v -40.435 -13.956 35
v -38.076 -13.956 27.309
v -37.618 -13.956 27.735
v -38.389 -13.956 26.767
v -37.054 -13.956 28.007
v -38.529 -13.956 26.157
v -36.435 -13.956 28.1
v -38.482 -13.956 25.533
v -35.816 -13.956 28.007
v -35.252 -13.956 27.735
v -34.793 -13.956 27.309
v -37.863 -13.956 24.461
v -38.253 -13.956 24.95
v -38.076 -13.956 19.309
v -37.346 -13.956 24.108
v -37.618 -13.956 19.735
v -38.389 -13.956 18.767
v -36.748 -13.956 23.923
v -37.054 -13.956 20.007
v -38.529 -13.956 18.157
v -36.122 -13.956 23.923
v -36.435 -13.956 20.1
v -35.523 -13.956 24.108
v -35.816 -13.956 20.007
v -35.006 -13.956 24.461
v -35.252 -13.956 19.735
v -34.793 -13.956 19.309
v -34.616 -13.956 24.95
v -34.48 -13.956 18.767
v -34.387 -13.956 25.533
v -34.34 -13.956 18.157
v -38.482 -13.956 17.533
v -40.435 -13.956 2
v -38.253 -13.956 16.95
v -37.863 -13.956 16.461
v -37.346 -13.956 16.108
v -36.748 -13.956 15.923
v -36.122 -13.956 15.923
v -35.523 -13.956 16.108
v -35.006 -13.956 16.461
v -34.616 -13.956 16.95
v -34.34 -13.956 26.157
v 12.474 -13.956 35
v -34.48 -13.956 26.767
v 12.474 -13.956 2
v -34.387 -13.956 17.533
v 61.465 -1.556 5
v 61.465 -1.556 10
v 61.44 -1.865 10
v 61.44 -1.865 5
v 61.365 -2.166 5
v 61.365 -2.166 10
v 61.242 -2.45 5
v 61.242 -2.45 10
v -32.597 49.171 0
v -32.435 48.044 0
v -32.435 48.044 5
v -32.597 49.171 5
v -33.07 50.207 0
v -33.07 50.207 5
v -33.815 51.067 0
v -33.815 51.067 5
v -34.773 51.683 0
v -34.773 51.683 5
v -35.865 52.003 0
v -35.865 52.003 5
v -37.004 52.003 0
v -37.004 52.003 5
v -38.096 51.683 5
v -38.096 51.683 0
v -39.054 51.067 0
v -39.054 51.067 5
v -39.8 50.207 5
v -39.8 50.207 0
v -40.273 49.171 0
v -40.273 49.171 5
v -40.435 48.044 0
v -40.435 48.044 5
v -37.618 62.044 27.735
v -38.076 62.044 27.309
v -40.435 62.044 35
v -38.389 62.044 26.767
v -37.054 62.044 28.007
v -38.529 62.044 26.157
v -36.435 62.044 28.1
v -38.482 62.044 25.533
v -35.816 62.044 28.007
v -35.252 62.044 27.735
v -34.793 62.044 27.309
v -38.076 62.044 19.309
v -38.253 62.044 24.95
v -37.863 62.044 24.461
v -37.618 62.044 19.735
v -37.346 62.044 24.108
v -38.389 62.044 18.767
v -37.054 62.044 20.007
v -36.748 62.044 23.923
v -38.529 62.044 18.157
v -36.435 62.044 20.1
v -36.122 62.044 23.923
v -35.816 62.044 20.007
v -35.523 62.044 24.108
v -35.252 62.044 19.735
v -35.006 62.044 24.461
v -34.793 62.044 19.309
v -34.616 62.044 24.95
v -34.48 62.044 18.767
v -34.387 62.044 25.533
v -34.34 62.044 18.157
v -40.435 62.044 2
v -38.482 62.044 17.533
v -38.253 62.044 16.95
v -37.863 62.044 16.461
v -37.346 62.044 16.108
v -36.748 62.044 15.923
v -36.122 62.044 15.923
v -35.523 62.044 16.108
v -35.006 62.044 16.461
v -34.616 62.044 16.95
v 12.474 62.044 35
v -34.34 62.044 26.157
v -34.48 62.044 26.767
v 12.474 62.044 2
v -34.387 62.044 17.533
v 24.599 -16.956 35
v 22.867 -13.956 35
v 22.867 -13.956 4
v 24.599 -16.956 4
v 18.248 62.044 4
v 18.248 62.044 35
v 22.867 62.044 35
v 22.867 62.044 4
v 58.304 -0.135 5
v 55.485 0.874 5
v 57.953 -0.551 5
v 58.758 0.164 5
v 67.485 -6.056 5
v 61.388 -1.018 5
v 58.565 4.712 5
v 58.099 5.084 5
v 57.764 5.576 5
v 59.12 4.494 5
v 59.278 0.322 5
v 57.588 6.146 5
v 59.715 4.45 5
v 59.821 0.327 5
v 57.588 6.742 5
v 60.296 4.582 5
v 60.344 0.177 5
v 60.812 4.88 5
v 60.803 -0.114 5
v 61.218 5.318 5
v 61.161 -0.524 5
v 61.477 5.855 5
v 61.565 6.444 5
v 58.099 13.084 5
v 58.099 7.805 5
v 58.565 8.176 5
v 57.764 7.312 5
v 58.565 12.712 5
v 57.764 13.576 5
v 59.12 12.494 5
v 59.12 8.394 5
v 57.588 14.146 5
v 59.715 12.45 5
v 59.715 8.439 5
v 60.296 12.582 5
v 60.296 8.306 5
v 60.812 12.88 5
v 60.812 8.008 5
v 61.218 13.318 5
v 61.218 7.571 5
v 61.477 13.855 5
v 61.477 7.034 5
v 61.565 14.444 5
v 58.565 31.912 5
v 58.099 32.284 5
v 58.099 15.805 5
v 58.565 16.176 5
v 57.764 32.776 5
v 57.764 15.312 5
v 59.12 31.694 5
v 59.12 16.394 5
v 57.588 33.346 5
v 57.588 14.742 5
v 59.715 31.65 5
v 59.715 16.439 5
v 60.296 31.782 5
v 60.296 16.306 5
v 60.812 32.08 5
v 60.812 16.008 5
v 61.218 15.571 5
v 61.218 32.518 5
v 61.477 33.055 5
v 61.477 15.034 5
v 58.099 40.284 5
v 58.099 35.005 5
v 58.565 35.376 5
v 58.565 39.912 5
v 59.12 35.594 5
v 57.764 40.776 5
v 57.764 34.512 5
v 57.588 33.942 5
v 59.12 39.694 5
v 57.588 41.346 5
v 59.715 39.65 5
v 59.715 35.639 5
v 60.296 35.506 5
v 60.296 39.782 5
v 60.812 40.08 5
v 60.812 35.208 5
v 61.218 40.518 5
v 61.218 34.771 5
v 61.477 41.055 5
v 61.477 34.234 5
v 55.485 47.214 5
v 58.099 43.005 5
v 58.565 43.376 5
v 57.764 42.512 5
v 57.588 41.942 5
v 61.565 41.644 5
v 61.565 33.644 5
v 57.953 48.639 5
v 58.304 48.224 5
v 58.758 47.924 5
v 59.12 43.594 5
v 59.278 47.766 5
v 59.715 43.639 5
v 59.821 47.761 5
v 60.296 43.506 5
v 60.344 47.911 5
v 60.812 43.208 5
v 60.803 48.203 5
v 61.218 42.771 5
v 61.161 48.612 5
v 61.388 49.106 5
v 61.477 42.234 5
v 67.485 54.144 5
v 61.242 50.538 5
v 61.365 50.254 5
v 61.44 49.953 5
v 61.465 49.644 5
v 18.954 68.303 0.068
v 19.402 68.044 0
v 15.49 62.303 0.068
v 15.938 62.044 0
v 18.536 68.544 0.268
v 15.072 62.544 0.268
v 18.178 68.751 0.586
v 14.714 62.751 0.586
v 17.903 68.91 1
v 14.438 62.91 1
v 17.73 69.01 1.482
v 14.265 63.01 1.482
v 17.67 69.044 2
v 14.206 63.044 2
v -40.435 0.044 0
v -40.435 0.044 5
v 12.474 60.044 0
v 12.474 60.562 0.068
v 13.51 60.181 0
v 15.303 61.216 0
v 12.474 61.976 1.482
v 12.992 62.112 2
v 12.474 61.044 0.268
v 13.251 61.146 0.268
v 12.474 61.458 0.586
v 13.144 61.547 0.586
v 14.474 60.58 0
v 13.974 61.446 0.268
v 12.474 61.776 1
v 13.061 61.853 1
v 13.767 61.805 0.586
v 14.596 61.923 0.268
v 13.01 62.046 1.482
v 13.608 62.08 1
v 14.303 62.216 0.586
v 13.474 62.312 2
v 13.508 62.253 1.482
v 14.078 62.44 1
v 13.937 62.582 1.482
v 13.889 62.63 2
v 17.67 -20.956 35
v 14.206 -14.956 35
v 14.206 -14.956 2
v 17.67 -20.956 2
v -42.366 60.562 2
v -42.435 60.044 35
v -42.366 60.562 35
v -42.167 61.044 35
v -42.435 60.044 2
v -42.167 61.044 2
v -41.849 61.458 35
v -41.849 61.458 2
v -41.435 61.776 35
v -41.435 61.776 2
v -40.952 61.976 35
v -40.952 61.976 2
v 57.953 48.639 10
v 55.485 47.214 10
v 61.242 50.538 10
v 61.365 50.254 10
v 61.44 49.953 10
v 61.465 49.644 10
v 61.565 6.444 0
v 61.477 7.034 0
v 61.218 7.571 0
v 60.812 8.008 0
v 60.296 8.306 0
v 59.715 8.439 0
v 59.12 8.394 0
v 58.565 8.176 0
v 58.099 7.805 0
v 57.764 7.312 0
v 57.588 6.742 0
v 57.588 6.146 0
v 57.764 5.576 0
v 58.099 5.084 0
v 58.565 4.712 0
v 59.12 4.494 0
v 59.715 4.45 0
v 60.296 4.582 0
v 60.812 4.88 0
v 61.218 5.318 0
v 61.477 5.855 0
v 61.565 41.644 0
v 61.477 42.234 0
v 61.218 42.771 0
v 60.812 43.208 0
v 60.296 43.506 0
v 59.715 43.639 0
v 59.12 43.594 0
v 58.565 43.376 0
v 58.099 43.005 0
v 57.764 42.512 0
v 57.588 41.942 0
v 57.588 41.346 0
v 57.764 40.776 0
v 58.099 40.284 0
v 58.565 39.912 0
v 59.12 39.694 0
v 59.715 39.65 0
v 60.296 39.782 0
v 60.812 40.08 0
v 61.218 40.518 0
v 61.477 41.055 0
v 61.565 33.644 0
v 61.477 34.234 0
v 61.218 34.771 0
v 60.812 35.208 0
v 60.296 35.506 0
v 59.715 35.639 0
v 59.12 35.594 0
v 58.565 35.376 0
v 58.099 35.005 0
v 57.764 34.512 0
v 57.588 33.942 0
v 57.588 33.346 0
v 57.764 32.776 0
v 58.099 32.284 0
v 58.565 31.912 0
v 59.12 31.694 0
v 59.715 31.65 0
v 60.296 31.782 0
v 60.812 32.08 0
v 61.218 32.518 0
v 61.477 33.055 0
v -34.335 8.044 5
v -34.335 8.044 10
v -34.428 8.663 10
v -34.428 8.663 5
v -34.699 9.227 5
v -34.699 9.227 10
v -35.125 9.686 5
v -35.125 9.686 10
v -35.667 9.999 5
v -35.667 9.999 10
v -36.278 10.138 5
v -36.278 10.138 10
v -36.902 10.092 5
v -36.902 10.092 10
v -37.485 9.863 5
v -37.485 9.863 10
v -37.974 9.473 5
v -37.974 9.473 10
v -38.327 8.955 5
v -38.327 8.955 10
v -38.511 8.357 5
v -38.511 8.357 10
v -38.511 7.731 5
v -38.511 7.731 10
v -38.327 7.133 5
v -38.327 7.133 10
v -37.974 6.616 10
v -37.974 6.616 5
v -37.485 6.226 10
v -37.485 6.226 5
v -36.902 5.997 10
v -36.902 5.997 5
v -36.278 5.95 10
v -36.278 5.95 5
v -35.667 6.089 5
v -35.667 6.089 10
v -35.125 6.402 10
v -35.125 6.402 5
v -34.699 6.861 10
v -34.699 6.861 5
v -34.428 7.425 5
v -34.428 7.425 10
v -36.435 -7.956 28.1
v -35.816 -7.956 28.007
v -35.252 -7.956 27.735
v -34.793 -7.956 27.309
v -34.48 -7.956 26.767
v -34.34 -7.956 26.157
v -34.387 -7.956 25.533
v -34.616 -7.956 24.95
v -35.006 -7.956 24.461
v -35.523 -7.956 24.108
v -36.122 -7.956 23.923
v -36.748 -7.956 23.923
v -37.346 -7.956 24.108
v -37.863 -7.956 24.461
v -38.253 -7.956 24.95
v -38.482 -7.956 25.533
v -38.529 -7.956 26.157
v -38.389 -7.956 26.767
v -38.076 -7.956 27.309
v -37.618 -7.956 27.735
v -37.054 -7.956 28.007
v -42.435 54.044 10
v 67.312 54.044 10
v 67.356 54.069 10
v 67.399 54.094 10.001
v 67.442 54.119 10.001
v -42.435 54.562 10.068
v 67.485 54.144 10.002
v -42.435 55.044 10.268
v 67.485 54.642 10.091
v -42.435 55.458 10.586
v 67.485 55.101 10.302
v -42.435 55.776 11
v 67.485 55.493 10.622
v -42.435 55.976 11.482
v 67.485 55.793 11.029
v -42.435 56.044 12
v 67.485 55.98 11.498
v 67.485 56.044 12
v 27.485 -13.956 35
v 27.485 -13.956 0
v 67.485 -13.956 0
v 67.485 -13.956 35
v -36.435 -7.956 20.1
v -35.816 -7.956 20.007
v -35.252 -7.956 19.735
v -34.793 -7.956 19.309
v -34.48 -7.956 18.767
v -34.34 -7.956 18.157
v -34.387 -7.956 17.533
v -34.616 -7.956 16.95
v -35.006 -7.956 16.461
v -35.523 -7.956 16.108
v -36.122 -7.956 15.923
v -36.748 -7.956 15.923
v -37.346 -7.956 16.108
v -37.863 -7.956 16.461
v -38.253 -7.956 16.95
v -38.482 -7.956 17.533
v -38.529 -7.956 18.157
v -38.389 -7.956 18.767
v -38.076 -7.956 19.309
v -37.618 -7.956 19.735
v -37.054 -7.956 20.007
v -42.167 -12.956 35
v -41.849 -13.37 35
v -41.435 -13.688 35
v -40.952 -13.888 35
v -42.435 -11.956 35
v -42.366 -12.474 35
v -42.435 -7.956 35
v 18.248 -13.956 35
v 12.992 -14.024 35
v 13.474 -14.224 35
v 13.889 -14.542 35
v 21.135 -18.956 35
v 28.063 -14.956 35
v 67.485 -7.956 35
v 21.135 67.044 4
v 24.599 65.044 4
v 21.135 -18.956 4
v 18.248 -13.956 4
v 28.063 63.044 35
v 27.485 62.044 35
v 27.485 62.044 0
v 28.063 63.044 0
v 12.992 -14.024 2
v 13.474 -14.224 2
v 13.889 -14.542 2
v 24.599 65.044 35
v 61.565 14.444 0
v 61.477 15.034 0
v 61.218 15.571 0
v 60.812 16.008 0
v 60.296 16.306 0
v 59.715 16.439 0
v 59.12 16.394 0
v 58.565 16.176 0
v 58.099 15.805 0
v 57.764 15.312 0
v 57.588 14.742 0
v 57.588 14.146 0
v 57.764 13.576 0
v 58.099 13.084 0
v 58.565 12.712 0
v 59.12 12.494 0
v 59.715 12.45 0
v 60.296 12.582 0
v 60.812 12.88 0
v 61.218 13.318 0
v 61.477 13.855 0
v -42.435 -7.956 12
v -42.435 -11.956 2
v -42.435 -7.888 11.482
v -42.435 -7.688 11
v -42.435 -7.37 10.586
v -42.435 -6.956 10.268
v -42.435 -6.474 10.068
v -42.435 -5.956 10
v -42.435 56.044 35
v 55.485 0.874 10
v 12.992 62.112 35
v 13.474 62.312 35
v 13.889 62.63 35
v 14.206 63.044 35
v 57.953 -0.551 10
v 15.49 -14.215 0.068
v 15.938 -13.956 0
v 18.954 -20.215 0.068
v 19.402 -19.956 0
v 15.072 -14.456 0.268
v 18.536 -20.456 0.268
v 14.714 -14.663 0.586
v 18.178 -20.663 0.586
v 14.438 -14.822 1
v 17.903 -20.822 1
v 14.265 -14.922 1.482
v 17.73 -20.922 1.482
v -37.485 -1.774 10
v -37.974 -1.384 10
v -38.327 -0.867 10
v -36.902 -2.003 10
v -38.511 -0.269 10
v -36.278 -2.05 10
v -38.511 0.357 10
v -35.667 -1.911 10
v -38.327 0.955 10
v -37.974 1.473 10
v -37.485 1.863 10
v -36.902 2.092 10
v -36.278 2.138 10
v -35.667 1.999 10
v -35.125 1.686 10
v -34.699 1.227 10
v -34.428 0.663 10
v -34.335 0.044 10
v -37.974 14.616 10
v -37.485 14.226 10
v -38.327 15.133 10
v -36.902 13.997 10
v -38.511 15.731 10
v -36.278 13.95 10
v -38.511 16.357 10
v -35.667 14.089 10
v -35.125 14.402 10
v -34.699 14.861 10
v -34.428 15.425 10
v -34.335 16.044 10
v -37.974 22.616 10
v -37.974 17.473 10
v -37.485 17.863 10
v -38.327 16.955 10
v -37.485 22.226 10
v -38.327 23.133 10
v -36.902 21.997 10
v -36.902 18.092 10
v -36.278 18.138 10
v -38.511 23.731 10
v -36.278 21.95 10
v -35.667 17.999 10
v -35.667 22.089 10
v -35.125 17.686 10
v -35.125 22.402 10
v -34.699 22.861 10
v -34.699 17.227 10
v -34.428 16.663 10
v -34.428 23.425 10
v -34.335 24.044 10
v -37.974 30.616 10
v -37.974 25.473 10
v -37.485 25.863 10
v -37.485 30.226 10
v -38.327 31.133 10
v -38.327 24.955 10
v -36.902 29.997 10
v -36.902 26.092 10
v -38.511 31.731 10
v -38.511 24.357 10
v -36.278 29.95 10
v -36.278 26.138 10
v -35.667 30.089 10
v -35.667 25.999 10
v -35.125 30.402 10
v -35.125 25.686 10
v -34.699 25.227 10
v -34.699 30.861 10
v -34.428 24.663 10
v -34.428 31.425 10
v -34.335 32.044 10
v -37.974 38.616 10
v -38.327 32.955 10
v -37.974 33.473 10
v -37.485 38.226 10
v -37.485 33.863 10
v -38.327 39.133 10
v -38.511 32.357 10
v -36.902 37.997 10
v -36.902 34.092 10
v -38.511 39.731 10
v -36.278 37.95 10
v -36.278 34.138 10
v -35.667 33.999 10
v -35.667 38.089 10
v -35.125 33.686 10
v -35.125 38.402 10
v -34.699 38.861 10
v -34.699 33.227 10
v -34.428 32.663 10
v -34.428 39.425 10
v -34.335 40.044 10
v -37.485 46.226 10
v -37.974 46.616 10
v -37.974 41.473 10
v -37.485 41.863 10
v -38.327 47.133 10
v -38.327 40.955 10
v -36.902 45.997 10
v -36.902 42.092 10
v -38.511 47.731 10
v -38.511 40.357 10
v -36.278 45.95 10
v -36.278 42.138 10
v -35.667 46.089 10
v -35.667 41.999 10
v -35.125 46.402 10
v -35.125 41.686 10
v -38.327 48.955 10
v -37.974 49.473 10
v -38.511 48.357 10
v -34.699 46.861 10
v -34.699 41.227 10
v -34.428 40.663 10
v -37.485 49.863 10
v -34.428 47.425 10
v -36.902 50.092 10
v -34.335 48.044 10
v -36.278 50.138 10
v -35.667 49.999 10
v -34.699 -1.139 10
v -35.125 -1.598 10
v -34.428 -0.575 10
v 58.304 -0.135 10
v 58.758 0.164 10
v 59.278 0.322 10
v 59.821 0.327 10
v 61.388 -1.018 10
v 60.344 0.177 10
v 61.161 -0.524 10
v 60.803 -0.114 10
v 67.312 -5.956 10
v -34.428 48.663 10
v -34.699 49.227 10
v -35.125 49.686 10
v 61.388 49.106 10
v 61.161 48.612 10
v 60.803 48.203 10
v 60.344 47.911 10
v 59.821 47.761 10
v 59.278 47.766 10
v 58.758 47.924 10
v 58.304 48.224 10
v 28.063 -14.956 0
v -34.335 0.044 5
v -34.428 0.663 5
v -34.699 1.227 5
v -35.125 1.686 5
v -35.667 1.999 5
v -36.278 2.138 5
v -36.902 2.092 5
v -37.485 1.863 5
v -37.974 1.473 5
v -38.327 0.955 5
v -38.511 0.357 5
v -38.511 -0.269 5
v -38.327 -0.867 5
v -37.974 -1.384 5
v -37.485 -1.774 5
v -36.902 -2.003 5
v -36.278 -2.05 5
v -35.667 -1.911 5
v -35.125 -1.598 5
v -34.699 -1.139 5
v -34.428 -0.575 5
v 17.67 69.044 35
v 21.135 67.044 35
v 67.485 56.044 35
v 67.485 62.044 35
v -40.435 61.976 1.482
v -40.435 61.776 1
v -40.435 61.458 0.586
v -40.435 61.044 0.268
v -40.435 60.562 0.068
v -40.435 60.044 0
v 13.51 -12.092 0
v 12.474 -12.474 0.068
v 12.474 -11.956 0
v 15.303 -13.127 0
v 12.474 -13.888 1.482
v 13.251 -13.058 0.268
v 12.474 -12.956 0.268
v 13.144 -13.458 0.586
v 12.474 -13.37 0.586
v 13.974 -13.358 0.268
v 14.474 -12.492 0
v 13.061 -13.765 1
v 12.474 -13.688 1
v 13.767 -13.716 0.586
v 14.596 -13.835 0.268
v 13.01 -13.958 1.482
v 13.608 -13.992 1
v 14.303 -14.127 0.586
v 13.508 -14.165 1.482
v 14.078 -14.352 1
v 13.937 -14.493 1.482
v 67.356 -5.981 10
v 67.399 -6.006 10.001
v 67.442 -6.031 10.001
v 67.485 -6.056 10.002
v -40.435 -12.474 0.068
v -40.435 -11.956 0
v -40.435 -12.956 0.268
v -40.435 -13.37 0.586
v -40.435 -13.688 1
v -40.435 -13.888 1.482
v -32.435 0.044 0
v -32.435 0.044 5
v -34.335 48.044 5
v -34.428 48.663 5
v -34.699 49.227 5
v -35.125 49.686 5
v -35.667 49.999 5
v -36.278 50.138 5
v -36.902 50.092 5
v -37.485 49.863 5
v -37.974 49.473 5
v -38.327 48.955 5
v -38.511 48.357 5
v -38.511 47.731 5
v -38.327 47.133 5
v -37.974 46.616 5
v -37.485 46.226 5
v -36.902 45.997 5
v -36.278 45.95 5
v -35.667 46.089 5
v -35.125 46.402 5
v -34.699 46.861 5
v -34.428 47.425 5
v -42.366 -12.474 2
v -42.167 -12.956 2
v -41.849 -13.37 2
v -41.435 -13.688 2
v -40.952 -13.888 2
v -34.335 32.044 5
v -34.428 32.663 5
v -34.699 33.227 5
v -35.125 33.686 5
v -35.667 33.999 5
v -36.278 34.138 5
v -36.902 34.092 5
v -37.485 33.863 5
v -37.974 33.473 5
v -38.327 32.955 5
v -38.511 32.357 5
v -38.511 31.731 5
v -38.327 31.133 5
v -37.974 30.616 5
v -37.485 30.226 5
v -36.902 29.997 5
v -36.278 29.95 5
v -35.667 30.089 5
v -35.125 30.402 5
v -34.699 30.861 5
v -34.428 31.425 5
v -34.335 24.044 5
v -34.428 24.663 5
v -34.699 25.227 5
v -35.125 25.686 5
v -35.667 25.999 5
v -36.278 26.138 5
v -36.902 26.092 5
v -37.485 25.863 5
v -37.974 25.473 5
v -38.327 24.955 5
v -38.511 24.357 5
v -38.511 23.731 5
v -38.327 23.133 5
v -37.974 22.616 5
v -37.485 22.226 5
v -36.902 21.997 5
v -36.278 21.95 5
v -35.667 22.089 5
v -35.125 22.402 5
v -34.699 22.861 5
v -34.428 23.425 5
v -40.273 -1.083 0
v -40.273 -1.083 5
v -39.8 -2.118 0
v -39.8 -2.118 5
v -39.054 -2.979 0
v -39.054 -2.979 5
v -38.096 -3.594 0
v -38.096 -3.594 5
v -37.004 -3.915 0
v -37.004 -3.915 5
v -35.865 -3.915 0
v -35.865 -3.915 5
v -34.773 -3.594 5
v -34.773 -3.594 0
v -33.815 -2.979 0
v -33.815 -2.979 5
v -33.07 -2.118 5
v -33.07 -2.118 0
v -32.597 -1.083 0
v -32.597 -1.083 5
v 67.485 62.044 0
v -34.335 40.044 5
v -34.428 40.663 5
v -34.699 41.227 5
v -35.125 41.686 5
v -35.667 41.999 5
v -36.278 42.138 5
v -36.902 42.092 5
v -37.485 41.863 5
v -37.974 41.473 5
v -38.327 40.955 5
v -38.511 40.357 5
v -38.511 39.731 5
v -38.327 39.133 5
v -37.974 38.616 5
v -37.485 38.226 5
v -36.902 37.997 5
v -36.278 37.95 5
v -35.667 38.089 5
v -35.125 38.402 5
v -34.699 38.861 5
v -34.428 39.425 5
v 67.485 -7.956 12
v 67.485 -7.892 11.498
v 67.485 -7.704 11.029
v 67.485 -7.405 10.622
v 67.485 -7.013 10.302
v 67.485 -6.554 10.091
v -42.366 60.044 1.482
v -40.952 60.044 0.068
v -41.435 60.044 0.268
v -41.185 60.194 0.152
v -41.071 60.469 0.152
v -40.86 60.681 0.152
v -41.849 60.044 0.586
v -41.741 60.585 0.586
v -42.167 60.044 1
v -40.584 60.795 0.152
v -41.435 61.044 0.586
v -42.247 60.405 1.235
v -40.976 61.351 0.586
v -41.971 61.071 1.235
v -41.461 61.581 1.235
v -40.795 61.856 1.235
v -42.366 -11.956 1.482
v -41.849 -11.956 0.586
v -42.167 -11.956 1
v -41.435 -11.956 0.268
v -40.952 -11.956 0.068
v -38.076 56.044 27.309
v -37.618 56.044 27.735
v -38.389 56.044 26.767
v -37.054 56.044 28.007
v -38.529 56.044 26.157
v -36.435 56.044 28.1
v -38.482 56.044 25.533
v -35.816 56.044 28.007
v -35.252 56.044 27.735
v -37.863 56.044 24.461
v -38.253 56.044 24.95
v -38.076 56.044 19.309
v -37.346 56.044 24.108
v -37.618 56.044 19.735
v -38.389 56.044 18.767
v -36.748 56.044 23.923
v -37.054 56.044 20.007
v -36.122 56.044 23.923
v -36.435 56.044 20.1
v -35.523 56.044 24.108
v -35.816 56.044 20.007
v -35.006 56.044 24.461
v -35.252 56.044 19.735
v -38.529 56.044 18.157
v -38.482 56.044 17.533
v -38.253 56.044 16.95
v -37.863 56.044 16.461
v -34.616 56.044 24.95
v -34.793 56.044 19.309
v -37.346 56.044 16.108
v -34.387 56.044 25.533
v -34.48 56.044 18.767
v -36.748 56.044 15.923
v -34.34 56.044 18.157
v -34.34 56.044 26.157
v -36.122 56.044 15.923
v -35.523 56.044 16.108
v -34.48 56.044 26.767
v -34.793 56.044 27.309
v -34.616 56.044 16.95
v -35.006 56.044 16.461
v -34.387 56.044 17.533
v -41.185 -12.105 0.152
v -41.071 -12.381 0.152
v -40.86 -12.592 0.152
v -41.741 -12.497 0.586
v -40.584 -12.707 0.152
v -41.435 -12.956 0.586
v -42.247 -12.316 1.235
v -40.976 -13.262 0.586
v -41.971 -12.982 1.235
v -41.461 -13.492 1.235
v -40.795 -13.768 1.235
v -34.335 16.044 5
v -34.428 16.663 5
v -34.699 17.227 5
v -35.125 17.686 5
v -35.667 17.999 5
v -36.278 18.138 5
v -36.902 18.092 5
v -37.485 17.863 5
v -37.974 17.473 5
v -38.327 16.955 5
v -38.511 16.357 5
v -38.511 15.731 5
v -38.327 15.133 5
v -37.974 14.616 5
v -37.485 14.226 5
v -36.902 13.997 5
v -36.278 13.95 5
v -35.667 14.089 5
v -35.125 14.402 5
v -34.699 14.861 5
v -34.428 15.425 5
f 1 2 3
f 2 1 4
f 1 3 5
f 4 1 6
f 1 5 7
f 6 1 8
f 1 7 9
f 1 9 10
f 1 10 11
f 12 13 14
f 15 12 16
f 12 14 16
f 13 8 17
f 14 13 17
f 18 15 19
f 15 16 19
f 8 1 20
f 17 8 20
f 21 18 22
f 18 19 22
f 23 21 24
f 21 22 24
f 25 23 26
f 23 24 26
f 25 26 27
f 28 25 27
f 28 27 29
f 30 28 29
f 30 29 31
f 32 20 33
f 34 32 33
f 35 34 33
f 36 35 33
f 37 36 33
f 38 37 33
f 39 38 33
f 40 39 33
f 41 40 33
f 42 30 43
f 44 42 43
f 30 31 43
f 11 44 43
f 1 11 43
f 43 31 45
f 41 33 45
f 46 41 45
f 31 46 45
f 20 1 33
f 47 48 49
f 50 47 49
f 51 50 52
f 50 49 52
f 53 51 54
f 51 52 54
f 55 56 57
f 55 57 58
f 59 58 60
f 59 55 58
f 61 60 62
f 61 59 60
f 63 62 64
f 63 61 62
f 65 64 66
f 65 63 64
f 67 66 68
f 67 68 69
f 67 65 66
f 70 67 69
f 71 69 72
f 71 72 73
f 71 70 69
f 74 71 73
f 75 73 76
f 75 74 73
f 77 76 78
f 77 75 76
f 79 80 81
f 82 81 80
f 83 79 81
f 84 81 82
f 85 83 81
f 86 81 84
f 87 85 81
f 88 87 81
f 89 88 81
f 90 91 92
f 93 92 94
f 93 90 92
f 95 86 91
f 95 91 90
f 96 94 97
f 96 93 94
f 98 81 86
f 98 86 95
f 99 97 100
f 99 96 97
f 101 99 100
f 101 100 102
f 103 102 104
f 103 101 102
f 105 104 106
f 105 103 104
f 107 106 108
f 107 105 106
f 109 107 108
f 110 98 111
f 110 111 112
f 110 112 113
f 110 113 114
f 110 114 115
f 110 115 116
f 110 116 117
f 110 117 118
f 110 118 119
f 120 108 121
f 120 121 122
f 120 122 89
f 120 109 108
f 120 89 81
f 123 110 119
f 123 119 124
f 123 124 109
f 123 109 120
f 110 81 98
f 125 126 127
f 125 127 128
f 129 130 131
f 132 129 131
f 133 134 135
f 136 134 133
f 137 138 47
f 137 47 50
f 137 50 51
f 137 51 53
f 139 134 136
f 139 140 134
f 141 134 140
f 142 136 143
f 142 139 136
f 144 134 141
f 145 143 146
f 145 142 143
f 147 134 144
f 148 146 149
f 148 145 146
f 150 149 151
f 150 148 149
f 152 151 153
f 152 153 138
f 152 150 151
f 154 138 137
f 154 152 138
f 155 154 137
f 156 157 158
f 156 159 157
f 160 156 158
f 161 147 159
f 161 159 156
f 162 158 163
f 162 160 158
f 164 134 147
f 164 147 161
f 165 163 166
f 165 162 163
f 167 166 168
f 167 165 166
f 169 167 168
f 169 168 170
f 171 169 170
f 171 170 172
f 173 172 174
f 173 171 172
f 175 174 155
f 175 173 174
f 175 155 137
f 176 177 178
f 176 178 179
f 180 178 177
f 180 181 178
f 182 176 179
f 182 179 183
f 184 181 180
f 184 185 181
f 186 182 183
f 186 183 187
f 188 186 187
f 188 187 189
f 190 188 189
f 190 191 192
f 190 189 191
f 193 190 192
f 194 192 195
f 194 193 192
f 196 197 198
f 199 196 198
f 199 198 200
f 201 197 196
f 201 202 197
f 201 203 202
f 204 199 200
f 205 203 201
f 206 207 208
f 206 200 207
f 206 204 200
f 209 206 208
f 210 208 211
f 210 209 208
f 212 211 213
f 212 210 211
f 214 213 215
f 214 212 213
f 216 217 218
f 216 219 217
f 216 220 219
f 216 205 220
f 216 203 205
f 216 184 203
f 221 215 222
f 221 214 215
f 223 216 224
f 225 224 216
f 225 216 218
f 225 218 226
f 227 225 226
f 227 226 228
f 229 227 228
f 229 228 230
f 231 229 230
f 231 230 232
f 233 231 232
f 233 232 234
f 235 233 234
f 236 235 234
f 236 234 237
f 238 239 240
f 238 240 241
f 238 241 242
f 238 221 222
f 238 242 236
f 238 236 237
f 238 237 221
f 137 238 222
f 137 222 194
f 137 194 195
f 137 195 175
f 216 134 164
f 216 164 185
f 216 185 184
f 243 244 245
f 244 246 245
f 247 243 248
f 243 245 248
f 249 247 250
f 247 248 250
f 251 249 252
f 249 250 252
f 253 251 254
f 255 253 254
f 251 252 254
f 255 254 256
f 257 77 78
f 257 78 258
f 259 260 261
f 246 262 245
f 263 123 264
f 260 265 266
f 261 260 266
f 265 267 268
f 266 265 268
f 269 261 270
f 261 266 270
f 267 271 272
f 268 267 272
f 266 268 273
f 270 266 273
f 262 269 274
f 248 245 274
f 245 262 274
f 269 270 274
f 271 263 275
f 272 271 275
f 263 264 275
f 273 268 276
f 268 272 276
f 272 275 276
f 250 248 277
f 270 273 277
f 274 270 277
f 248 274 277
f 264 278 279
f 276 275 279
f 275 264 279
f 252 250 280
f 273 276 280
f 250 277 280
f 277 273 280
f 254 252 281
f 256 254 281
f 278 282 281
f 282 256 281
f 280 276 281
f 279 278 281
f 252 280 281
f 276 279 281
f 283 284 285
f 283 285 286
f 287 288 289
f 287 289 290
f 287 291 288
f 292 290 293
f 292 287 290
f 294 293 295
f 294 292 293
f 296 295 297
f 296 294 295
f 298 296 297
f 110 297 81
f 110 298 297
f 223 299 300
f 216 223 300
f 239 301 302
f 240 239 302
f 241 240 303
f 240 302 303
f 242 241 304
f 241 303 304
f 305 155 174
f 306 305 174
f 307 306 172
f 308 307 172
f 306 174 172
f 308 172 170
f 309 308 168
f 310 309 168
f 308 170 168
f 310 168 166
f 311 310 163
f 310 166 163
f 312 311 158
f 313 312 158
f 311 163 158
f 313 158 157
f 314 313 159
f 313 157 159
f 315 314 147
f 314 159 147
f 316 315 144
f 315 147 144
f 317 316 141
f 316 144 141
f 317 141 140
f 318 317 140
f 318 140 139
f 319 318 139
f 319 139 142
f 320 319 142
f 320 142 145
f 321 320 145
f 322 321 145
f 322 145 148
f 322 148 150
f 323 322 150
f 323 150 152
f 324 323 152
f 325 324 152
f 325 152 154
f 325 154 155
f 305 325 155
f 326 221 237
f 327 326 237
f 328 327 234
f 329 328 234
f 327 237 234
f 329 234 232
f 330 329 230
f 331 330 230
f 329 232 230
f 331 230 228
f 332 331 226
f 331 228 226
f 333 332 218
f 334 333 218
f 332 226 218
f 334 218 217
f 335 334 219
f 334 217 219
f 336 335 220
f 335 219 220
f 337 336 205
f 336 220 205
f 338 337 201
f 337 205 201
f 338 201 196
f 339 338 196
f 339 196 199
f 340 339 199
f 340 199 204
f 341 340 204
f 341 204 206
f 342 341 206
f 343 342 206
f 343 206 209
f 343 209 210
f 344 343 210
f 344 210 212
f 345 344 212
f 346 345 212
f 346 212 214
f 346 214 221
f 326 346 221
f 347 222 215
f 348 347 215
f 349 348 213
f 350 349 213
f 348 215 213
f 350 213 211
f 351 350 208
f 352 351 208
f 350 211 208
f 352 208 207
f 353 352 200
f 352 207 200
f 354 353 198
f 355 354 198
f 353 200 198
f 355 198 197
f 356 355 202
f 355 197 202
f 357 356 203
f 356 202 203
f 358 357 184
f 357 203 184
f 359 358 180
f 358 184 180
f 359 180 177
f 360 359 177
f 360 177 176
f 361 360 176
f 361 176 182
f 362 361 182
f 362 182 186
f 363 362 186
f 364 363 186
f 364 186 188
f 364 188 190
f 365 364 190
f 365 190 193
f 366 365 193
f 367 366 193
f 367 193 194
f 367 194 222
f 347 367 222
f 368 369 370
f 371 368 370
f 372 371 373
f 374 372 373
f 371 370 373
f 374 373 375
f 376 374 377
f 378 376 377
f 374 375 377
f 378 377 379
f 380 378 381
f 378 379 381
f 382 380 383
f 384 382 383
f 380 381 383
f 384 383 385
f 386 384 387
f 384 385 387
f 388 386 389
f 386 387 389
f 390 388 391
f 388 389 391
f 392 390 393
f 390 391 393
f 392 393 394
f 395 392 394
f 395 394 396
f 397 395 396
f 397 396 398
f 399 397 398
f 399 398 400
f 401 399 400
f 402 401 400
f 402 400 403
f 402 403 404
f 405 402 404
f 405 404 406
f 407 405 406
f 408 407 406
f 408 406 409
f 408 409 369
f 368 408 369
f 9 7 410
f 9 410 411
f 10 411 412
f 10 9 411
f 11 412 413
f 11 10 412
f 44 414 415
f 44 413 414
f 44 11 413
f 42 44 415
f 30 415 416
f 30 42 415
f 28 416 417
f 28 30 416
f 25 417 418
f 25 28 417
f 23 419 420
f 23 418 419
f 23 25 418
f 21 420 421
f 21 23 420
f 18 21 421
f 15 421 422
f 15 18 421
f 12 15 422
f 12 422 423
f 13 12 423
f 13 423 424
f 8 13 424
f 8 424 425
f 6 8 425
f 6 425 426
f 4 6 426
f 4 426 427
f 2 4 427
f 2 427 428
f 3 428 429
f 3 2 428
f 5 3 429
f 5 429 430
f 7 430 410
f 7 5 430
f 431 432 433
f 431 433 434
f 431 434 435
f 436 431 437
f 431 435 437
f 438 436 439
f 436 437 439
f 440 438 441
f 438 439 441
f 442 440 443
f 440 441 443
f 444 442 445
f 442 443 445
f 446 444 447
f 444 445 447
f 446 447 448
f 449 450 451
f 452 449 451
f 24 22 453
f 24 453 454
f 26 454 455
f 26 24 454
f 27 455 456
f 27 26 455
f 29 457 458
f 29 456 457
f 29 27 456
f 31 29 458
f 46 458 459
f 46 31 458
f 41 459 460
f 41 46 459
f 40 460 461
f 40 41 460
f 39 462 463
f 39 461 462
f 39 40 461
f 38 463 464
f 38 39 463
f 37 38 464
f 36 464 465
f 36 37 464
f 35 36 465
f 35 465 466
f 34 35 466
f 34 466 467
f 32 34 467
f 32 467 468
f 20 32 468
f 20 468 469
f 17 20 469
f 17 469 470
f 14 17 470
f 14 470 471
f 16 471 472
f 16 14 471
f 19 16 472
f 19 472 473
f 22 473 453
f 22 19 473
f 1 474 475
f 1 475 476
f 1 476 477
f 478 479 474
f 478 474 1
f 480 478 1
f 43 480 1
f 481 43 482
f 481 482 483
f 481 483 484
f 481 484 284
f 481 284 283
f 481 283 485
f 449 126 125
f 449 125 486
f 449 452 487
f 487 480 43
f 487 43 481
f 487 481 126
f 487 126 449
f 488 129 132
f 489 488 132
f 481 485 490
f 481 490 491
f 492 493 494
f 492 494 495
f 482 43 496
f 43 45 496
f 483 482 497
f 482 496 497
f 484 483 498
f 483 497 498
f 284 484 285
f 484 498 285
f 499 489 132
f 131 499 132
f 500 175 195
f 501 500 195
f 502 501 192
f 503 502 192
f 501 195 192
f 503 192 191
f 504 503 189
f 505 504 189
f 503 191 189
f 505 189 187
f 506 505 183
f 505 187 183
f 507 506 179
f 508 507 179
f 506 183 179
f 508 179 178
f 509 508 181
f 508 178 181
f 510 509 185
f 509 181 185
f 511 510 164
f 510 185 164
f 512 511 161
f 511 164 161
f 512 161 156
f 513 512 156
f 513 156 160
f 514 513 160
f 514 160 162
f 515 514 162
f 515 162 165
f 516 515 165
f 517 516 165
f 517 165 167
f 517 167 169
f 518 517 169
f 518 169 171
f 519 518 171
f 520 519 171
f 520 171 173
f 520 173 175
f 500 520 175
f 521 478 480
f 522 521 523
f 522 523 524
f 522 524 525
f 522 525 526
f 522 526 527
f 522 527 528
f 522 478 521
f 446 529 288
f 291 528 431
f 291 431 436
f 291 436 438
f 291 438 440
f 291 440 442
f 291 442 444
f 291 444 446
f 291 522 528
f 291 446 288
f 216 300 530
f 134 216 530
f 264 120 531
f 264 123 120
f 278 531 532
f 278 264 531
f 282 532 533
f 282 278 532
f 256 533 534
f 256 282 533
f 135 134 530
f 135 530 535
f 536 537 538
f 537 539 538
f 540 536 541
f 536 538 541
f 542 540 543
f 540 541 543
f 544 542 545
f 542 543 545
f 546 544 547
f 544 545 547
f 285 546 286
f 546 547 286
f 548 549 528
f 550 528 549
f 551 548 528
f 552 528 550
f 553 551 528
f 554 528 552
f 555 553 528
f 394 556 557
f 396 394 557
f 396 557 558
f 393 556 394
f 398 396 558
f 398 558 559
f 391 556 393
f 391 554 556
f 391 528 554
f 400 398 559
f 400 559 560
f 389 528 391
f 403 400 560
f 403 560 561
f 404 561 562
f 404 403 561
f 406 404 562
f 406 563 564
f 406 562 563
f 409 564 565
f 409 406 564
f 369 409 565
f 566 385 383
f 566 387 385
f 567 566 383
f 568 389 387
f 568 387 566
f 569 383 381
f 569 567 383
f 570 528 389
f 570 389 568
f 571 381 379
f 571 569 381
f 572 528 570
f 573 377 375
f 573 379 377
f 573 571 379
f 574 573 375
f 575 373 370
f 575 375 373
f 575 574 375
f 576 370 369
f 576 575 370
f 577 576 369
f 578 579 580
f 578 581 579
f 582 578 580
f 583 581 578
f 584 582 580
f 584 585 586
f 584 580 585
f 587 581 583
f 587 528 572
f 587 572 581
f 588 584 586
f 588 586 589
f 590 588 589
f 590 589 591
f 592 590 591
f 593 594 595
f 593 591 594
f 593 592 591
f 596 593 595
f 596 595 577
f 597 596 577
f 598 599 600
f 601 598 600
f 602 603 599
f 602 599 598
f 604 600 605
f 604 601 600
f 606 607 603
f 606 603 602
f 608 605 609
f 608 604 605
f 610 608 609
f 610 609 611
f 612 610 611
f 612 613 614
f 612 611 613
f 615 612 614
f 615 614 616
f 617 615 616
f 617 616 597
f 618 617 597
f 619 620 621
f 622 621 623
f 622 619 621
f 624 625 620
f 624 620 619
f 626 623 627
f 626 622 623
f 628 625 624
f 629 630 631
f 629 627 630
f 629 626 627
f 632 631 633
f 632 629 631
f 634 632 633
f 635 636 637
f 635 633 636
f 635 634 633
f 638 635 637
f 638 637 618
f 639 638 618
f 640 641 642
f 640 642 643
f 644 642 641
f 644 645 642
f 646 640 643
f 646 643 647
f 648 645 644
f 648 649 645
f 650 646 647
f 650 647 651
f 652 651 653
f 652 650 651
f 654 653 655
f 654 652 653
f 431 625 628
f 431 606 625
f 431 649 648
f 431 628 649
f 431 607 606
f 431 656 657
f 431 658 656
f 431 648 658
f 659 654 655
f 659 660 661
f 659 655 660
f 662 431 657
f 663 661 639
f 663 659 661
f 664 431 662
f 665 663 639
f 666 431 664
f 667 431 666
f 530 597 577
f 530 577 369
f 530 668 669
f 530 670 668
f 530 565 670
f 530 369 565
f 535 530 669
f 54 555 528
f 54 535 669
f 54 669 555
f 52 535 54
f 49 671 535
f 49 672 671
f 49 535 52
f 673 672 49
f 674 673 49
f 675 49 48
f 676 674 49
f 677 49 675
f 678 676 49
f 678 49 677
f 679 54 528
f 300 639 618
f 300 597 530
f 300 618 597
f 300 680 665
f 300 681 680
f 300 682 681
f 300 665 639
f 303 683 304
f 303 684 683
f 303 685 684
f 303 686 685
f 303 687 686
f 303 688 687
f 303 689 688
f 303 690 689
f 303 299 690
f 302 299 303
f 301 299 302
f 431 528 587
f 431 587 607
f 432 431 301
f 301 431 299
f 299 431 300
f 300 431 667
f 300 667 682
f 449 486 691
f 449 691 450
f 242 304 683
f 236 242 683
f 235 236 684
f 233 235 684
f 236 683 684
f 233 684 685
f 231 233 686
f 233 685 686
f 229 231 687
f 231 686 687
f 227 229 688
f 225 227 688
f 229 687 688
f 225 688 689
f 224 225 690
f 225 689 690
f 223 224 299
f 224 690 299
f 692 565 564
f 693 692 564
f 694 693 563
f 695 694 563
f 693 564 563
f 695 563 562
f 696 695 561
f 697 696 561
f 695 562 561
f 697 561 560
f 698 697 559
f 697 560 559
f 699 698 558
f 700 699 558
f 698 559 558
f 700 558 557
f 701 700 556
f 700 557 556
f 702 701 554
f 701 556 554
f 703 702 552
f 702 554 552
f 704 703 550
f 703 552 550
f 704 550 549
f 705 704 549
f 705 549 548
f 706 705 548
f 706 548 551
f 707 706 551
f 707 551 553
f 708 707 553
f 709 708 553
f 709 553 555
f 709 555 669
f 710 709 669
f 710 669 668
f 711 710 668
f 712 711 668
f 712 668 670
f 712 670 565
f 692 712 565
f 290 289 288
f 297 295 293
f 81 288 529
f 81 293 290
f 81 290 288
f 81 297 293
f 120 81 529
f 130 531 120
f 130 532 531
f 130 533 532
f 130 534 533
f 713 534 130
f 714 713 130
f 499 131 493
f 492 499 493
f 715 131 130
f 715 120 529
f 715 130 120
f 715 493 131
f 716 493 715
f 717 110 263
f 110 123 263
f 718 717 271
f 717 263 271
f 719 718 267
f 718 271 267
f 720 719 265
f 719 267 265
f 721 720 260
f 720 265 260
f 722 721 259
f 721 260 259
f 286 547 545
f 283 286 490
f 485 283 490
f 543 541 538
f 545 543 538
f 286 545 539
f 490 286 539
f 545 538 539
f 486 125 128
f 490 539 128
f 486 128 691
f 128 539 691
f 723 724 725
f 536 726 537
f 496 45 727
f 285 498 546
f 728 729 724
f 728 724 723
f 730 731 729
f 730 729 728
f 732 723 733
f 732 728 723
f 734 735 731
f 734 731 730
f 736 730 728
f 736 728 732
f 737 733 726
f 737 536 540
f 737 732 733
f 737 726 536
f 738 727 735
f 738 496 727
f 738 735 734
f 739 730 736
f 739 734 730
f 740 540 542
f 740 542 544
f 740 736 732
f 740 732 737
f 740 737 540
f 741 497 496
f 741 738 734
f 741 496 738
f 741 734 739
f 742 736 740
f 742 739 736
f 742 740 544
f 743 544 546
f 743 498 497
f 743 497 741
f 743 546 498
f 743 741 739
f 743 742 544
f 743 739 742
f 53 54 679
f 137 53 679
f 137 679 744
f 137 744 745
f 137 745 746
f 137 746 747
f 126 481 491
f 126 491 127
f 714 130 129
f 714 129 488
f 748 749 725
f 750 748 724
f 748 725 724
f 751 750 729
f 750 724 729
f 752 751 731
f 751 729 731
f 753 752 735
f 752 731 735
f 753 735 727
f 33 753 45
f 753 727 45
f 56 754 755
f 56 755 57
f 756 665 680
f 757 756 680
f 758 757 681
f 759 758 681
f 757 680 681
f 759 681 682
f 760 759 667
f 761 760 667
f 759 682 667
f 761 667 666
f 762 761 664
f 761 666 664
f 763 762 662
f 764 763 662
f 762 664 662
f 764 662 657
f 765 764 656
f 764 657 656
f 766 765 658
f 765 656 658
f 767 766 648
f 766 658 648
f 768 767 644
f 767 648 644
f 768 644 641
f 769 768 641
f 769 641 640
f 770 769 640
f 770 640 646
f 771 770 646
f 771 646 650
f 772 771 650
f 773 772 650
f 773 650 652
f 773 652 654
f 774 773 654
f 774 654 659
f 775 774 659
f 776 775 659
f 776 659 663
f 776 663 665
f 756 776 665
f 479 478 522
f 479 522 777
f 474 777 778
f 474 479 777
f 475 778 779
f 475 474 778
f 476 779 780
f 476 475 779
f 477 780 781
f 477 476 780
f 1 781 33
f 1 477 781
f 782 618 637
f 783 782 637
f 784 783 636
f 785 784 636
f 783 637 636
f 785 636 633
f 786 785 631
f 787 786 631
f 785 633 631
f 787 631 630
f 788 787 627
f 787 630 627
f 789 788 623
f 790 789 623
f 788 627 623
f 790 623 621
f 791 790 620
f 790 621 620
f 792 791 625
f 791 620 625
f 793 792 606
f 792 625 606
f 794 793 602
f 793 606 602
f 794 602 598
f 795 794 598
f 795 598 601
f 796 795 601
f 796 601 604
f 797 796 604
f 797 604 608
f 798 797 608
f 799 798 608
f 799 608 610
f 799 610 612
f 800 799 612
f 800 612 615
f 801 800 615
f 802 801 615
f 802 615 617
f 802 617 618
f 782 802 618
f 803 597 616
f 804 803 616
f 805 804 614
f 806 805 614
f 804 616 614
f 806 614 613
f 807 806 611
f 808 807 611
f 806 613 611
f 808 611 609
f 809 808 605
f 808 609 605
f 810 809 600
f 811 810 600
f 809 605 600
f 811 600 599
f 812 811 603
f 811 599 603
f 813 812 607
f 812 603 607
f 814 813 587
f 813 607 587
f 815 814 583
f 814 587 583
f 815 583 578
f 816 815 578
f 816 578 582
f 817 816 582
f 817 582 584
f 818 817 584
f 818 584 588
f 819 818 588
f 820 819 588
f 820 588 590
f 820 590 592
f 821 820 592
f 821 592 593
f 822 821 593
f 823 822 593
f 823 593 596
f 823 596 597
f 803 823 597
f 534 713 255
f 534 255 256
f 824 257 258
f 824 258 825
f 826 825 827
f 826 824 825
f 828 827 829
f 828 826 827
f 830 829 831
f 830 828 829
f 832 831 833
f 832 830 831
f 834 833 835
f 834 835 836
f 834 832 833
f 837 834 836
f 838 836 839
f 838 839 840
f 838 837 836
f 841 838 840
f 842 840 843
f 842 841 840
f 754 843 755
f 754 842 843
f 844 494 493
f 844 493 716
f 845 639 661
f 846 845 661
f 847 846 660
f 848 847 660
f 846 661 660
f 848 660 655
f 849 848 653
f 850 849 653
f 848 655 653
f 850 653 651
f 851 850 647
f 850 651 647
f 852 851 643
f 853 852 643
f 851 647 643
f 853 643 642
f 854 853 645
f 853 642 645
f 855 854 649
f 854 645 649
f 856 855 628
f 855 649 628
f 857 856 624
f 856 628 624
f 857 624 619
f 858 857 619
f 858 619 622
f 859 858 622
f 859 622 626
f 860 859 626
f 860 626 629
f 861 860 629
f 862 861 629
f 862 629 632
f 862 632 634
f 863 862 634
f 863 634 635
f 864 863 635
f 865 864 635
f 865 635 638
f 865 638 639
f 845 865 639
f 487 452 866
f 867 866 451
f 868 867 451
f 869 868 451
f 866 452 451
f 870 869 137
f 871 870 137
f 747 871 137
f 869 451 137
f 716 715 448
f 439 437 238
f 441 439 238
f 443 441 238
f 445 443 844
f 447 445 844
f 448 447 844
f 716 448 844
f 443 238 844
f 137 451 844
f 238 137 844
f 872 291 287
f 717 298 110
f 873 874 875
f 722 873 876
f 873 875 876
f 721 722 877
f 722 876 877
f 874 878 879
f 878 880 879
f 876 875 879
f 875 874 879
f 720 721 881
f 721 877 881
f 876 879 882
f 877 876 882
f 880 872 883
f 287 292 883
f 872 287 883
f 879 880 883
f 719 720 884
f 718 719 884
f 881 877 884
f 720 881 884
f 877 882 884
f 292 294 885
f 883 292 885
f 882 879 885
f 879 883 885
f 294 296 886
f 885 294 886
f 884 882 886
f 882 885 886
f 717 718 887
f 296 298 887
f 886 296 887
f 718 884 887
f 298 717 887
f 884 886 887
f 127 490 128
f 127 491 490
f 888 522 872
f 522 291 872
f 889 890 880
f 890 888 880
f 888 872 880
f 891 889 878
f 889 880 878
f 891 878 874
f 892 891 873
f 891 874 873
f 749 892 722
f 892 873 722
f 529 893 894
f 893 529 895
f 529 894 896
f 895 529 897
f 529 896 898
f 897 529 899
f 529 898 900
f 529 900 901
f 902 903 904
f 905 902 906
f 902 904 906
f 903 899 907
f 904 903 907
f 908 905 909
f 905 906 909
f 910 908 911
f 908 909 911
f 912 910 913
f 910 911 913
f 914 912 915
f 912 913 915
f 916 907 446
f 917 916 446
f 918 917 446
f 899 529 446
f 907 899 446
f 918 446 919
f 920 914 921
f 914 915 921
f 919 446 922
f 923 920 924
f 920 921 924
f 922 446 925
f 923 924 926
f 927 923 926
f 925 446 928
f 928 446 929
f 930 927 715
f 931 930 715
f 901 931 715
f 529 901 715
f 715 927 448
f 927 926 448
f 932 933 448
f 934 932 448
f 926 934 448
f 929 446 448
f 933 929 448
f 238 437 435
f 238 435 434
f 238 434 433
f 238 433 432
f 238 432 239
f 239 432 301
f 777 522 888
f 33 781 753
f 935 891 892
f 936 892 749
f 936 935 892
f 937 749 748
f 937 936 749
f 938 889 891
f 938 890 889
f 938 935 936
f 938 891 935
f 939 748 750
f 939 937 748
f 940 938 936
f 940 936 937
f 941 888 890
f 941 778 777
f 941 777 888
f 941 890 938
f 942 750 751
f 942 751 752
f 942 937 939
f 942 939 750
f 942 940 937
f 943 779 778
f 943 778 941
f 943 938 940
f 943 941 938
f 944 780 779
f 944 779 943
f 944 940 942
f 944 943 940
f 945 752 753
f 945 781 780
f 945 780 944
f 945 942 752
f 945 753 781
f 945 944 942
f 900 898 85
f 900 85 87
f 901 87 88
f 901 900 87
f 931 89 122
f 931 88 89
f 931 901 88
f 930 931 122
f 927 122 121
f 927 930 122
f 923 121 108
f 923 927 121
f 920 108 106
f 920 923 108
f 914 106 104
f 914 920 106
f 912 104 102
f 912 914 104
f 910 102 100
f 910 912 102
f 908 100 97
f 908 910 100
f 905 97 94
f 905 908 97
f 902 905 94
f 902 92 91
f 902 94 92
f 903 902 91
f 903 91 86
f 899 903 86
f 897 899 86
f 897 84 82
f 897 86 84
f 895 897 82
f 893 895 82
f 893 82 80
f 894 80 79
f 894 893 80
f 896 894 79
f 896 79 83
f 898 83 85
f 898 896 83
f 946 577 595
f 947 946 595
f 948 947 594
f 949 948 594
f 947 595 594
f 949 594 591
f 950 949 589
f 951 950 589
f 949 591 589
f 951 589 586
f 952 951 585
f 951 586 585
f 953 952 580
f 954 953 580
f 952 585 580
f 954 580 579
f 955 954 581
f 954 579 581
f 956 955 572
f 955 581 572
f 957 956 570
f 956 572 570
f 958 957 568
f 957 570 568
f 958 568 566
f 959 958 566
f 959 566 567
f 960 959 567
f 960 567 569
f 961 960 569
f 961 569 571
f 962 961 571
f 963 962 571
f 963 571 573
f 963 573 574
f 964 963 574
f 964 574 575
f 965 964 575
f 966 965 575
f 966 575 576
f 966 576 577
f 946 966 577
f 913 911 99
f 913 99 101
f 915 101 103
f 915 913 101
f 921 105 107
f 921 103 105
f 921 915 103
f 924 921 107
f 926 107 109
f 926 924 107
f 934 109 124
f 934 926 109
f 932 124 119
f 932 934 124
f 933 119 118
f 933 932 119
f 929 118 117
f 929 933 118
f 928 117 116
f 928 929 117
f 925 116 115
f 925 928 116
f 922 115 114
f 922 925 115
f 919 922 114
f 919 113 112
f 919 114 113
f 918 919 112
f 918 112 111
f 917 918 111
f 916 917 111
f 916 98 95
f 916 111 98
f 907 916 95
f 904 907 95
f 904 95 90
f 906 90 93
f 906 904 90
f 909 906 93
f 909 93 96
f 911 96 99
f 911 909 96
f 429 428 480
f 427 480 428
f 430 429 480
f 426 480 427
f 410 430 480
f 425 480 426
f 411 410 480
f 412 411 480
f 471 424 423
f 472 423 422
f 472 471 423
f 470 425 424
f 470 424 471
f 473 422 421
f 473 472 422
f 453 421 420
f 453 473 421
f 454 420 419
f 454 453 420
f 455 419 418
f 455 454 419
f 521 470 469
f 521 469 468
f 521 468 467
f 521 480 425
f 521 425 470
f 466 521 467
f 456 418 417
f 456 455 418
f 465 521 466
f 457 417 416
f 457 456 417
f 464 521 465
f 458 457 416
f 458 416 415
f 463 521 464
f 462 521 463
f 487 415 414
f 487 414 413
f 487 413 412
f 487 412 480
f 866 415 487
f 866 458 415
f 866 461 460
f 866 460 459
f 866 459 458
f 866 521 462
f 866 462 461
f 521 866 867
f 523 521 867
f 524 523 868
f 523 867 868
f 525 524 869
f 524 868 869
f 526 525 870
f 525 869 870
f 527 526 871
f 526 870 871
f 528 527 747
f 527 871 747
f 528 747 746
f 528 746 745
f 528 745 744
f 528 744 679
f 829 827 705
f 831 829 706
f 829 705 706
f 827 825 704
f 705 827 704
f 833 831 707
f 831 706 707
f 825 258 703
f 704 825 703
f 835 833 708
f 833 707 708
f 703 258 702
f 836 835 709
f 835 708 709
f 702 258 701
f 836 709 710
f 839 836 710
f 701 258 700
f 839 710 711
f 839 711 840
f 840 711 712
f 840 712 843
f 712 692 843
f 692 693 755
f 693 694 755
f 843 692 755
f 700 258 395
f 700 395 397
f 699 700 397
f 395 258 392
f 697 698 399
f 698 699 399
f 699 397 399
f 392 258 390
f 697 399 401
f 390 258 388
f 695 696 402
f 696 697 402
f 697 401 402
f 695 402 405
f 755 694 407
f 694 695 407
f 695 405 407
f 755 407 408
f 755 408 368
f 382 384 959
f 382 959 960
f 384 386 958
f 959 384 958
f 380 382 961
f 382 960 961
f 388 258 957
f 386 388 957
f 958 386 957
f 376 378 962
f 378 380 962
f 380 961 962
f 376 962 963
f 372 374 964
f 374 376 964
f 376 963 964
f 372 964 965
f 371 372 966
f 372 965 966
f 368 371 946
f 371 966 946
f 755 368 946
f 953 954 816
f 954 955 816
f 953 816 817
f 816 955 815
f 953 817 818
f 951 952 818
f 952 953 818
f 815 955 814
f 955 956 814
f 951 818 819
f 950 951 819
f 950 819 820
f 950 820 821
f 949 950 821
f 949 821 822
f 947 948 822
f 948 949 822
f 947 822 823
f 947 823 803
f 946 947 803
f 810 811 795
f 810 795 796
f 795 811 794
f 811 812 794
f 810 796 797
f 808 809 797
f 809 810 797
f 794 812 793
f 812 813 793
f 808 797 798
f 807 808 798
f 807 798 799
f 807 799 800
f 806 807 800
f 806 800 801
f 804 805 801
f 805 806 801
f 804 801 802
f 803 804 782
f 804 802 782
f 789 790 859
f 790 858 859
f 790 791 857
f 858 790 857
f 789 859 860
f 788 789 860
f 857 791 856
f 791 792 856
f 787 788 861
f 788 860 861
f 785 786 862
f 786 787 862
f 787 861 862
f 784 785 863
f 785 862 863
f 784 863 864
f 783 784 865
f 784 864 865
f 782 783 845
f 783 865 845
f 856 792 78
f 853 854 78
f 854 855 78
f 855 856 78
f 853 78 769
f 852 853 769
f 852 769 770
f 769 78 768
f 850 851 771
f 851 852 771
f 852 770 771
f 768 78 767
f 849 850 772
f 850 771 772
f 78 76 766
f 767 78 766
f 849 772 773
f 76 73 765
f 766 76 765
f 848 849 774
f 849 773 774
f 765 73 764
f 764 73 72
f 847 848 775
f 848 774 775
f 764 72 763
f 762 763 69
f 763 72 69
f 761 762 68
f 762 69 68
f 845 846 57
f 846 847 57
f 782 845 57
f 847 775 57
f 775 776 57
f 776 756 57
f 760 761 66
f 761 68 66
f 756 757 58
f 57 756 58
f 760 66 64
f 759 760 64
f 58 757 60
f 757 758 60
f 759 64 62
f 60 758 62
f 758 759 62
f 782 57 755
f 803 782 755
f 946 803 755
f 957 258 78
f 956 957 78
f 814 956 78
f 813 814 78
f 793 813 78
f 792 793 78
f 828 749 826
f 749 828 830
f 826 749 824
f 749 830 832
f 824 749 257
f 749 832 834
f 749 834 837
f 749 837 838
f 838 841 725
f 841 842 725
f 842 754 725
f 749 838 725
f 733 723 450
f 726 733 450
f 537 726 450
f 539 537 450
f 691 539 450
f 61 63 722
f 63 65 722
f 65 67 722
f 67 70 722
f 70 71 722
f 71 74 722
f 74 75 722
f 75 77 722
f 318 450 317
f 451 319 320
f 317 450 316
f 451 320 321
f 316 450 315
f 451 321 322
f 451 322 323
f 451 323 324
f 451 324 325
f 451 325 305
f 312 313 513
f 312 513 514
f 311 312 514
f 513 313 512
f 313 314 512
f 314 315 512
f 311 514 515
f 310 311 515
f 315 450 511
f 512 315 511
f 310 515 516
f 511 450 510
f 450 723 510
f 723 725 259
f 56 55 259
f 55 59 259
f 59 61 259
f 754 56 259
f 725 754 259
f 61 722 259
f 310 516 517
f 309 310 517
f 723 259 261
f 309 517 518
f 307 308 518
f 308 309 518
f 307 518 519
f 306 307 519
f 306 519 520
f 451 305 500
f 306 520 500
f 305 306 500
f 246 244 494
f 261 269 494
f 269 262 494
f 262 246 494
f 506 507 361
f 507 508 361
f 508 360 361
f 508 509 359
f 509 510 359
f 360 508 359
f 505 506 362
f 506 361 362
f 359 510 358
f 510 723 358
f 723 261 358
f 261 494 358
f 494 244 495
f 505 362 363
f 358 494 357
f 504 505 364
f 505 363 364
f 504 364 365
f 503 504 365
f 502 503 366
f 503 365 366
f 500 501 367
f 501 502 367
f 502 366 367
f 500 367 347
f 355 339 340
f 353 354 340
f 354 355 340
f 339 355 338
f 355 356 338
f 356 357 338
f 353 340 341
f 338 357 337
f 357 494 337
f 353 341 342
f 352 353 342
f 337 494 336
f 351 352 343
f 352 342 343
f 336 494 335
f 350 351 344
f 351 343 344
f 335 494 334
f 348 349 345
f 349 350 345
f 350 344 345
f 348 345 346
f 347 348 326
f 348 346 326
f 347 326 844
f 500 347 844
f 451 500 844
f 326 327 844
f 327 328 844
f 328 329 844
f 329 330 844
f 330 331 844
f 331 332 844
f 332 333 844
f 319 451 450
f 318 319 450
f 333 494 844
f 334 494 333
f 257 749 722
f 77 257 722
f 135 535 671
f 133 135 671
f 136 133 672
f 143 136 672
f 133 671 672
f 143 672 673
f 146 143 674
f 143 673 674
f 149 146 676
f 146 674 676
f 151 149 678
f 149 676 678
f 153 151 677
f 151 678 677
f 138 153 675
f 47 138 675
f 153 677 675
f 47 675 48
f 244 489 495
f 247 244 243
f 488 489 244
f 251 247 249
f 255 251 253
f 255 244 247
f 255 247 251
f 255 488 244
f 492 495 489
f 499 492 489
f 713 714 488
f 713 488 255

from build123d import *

# Parameters (mm, degrees)
SKETCH_2_W               = 109.92
SKETCH_2_H               = 76
EXTRUDE_1_DEPTH          = 10
CUT_EXTRUDE_1_DEPTH      = 5
SKETCH_4_R               = 2
CUT_EXTRUDE_2_DEPTH      = 92.808295873
SKETCH_5_W               = 109.92
SKETCH_5_H               = 6
EXTRUDE_2_DEPTH          = 25
CUT_EXTRUDE_3_DEPTH      = 104.340627651
CUT_EXTRUDE_3_DEPTH_BACK = 104.340627651
SKETCH_7_R               = 2.1
SKETCH_9_R               = 2.1
CUT_EXTRUDE_4_DEPTH      = 96.019804204
CUT_EXTRUDE_5_DEPTH      = 5
EXTRUDE_3_DEPTH          = 35
FILLET_1_R               = 2
EXTRUDE_4_DEPTH          = 4


with BuildPart() as part:
    # 草圖2 → 填料-伸長1 (new body)
    with BuildSketch(Plane.XY):
        with Locations((12.52544527, 24.044160626)):
            Rectangle(SKETCH_2_W, SKETCH_2_H)
    extrude(amount=EXTRUDE_1_DEPTH)

    # 草圖3 → 除料-伸長1 (cut)
    with BuildSketch(Plane.XY.offset(10)):
        with BuildLine():
            Line((67.48544527, -6.055839374), (67.48544527, 54.144160626))
            Line((67.48544527, 54.144160626), (61.24181631, 50.538464901))
            ThreePointArc((61.24181631, 50.538464901), (61.408690367, 50.105080914), (61.46544527, 49.644160626))
            ThreePointArc((61.46544527, 49.644160626), (60.088104264, 47.81746208), (57.95299519, 48.639170705))
            Line((57.95299519, 48.639170705), (55.48544527, 47.214160626))
            Line((55.48544527, 47.214160626), (55.48544527, 0.874160626))
            Line((55.48544527, 0.874160626), (57.95299519, -0.550849453))
            ThreePointArc((57.95299519, -0.550849453), (60.088104264, 0.270859171), (61.46544527, -1.555839374))
            ThreePointArc((61.46544527, -1.555839374), (61.408690367, -2.016759663), (61.24181631, -2.45014365))
            Line((61.24181631, -2.45014365), (67.48544527, -6.055839374))
        make_face()
    extrude(amount=-CUT_EXTRUDE_1_DEPTH, mode=Mode.SUBTRACT)

    # 草圖4 → 除料-伸長2 (cut, through all)
    with BuildSketch(Plane.XY.offset(5)):
        with Locations((59.56544527, 41.644160626)):
            Circle(SKETCH_4_R)
        with Locations((59.56544527, 33.644160626)):
            Circle(SKETCH_4_R)
        with Locations((59.56544527, 6.444160626)):
            Circle(SKETCH_4_R)
        with Locations((59.56544527, 14.444160626)):
            Circle(SKETCH_4_R)
    extrude(amount=-CUT_EXTRUDE_2_DEPTH, mode=Mode.SUBTRACT)

    # 草圖5 → 填料-伸長2 (add)
    with BuildSketch(Plane.XY.offset(10)):
        with Locations((12.52544527, -10.955839374)):
            Rectangle(SKETCH_5_W, SKETCH_5_H)
        with Locations((12.52544527, 59.044160626)):
            Rectangle(SKETCH_5_W, SKETCH_5_H)
    extrude(amount=EXTRUDE_2_DEPTH)

    # 草圖7 → 除料-伸長3 (cut, two sides: drawn at the far end of the back side and taken through both)
    with BuildSketch(Plane(origin=(0, -7.955839374, 0), x_dir=(1, 0, 0), z_dir=(0, 1, 0)).offset(-CUT_EXTRUDE_3_DEPTH_BACK)):
        with Locations(Location((-36.43455473, -18, 0), (0, 0, 270))):
            Circle(SKETCH_7_R)
        with Locations(Location((-36.43455473, -26, 0), (0, 0, 270))):
            Circle(SKETCH_7_R)
    extrude(amount=CUT_EXTRUDE_3_DEPTH + CUT_EXTRUDE_3_DEPTH_BACK, mode=Mode.SUBTRACT)

    # 草圖9 → 除料-伸長4 (cut, through all)
    with BuildSketch(Plane.XY.offset(10)):
        with Locations((-36.43455473, 0.044160626)):
            Circle(SKETCH_9_R)
        with Locations((-36.43455473, 8.044160626)):
            Circle(SKETCH_9_R)
        with Locations((-36.43455473, 16.044160626)):
            Circle(SKETCH_9_R)
        with Locations((-36.43455473, 24.044160626)):
            Circle(SKETCH_9_R)
        with Locations((-36.43455473, 32.044160626)):
            Circle(SKETCH_9_R)
        with Locations((-36.43455473, 40.044160626)):
            Circle(SKETCH_9_R)
        with Locations((-36.43455473, 48.044160626)):
            Circle(SKETCH_9_R)
    extrude(amount=-CUT_EXTRUDE_4_DEPTH, mode=Mode.SUBTRACT)

    # 草圖10 → 除料-伸長5 (cut)
    with BuildSketch(Plane(origin=(0, 0, 0), x_dir=(-1, 0, 0), z_dir=(0, 0, -1))):
        with BuildLine():
            Line((32.43455473, 0.044160626), (32.43455473, 48.044160626))
            ThreePointArc((32.43455473, 48.044160626), (36.43455473, 52.044160626), (40.43455473, 48.044160626))
            Line((40.43455473, 48.044160626), (40.43455473, 0.044160626))
            ThreePointArc((40.43455473, 0.044160626), (36.43455473, -3.955839374), (32.43455473, 0.044160626))
        make_face()
    extrude(amount=-CUT_EXTRUDE_5_DEPTH, mode=Mode.SUBTRACT)

    # 草圖12 → 填料-伸長3 (add)
    with BuildSketch(Plane.XY.offset(35)):
        Polygon((17.670490694, 69.044160626), (13.629038809, 62.044160626), (18.247840963, 62.044160626), (21.134592309, 67.044160626), align=None)
        Polygon((24.598693924, 65.044160626), (22.866643116, 62.044160626), (27.48544527, 62.044160626), (28.062795539, 63.044160626), align=None)
        Polygon((18.247840963, -13.955839374), (13.629038809, -13.955839374), (17.670490694, -20.955839374), (21.134592309, -18.955839374), align=None)
        Polygon((27.48544527, -13.955839374), (22.866643116, -13.955839374), (24.598693924, -16.955839374), (28.062795539, -14.955839374), align=None)
    extrude(amount=-EXTRUDE_3_DEPTH)

    # 圓角1
    fillet_1_edges = [part.edges().sort_by_distance(p)[0] for p in [
        (12.52544527, 56.044160626, 10),
        (12.52544527, -7.955839374, 10),
        (-42.43455473, 62.044160626, 17.5),
        (-42.43455473, -13.955839374, 17.5),
        (-42.43455473, 24.044160626, 0),
        (-14.40275796, -13.955839374, 0),
        (15.649764752, -17.455839374, 0),
        (15.649764752, 65.544160626, 0),
        (13.629038809, -13.955839374, 17.5),
        (13.629038809, 62.044160626, 17.5),
        (-14.40275796, 62.044160626, 0),
    ]]
    fillet(fillet_1_edges, radius=FILLET_1_R - 0.0001)  # a hair under: the kernel refuses the full size

    # 草圖13 → 填料-伸長4 (add)
    with BuildSketch(Plane(origin=(0, 0, 0), x_dir=(-1, 0, 0), z_dir=(0, 0, -1))):
        Polygon((-21.134592309, -18.955839374), (-24.598693924, -16.955839374), (-22.866643116, -13.955839374), (-18.247840963, -13.955839374), align=None)
        Polygon((-22.866643116, 62.044160626), (-24.598693924, 65.044160626), (-21.134592309, 67.044160626), (-18.247840963, 62.044160626), align=None)
    extrude(amount=-EXTRUDE_4_DEPTH)


solid = part.part
